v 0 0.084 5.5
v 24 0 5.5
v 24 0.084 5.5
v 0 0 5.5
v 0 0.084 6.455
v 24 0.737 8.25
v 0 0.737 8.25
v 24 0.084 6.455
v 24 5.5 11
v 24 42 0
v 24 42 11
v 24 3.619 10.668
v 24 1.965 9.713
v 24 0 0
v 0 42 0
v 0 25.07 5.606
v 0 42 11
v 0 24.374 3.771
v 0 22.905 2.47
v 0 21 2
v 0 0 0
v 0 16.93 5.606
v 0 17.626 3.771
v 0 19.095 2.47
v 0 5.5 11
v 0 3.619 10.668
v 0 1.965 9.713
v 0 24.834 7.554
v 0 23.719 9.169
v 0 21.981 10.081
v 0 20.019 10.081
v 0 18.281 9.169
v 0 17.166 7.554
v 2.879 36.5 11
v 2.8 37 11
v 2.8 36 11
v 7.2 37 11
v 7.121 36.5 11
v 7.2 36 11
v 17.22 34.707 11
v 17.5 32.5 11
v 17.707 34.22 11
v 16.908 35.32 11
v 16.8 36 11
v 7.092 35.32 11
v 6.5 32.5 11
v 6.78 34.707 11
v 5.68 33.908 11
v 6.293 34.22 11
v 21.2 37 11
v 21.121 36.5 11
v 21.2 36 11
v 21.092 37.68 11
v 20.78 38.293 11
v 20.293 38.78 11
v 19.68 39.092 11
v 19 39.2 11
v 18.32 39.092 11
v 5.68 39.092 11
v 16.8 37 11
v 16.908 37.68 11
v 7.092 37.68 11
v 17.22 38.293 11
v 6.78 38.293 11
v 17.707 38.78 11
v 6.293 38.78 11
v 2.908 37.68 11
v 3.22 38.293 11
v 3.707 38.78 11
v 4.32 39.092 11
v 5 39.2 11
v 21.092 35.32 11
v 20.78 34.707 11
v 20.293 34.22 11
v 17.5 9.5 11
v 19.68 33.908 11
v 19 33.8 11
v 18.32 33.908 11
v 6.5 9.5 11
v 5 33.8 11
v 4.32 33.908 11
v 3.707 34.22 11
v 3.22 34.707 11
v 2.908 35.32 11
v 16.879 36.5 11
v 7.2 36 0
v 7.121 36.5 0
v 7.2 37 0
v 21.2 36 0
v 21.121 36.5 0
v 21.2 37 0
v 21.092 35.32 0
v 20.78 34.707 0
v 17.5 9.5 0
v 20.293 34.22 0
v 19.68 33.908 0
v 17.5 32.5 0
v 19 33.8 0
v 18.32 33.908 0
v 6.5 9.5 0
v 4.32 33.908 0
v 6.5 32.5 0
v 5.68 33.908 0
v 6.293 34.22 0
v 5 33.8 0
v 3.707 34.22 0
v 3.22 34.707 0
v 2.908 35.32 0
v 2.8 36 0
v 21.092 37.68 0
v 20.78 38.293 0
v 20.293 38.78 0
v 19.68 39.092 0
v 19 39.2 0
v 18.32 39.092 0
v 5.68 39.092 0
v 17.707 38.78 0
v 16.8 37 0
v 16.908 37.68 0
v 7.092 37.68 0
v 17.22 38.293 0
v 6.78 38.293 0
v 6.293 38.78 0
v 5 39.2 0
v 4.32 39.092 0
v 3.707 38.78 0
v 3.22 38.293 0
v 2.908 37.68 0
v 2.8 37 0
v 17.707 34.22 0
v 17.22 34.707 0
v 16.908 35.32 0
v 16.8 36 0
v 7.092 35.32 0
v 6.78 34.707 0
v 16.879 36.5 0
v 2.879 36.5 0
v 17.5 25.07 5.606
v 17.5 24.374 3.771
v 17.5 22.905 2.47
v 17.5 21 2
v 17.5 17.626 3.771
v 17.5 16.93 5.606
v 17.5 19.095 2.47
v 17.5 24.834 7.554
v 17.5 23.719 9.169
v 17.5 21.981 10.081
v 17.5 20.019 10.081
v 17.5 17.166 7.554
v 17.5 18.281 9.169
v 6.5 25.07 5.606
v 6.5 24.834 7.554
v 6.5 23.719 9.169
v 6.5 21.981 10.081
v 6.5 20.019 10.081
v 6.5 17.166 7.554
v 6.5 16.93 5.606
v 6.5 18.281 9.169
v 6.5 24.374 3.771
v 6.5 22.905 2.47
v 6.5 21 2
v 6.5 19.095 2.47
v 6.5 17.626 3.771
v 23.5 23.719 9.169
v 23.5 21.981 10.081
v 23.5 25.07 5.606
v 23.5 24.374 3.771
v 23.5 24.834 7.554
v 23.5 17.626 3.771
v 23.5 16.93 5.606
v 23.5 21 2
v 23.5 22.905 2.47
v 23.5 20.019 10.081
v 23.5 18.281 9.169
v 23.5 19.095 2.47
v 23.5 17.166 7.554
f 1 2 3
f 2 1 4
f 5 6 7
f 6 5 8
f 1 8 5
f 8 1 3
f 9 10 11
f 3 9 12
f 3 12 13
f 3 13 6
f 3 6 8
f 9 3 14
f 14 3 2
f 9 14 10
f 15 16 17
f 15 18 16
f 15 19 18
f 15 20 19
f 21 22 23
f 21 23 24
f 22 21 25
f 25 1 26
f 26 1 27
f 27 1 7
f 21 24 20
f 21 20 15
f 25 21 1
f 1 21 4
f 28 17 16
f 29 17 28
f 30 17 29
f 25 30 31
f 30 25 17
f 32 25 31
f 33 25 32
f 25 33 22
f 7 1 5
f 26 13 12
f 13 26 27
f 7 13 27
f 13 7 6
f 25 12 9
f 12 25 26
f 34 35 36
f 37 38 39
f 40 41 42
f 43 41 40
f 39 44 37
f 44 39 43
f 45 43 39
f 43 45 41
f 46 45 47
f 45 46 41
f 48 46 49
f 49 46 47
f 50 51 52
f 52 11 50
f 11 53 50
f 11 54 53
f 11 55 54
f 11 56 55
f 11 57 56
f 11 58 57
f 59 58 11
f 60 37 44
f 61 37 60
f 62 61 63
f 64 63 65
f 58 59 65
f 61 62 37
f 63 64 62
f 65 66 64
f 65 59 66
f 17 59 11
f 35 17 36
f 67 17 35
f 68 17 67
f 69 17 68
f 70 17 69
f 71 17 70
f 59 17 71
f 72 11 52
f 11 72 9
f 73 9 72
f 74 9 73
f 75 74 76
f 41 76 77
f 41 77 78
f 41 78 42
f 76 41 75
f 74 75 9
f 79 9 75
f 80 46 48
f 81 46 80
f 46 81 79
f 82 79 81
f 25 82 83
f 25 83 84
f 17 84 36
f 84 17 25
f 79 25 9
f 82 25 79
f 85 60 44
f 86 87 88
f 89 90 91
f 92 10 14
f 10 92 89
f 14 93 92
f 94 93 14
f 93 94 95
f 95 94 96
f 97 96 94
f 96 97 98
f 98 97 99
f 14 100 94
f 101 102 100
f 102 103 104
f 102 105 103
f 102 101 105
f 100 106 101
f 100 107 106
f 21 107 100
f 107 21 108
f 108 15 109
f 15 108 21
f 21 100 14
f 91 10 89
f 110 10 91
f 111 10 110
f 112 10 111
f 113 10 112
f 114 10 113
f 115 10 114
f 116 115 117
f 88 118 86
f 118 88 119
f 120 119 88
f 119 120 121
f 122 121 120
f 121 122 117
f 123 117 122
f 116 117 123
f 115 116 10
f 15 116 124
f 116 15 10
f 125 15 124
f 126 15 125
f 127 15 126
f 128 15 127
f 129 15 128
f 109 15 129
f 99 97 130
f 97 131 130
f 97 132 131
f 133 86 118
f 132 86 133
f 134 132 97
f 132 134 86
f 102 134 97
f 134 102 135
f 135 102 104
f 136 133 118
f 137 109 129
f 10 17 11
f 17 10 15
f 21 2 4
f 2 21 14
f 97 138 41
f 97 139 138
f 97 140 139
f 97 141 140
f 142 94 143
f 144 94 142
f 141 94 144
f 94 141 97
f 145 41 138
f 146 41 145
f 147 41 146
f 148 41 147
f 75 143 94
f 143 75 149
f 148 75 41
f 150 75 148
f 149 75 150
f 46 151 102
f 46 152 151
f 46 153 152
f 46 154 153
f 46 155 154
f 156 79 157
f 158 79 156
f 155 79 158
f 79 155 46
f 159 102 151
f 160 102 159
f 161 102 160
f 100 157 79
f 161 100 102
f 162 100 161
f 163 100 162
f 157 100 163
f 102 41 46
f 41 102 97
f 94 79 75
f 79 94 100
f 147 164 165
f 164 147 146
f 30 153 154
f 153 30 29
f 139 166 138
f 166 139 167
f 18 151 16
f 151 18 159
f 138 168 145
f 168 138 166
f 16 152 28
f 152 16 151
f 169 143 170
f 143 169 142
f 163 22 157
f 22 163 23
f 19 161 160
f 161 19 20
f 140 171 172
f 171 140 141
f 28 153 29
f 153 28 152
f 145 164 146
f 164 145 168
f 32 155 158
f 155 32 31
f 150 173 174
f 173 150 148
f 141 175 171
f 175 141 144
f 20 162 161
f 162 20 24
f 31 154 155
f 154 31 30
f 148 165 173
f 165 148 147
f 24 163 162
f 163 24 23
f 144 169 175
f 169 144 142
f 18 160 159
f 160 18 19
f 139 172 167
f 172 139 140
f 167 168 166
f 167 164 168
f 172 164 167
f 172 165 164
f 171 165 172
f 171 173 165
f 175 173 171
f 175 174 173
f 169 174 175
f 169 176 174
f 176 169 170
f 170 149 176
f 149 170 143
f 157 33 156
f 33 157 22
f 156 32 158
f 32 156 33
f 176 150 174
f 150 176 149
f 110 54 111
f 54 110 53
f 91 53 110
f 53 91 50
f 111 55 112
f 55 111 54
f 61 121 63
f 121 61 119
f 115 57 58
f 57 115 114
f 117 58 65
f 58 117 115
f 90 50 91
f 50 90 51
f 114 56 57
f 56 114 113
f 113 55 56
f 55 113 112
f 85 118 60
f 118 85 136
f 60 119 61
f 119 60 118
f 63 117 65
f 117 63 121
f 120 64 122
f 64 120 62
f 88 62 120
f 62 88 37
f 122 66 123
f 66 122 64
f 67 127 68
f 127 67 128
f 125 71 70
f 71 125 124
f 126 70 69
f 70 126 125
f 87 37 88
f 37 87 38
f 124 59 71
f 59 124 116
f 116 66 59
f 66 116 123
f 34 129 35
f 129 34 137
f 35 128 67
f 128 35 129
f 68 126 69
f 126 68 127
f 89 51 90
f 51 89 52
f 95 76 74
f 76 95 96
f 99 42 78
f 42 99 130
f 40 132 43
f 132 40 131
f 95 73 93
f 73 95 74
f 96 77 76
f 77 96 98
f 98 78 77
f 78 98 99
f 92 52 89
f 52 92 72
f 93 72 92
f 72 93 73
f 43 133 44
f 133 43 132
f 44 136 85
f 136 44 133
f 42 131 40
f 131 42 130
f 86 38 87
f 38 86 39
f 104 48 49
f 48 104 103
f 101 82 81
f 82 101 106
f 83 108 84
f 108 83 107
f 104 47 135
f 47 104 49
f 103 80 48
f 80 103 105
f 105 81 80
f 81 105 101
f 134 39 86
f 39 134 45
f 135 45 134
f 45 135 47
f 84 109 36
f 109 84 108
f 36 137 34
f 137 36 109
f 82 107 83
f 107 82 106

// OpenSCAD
// PRUSA iteration3
// NEMA 17 extruder idler
// GNU GPL v3
// Josef Průša <iam@josefprusa.cz> and contributors
// http://www.reprap.org/wiki/Prusa_Mendel
// http://prusamendel.org


module extruder_idler_base(){
 difference() {translate([0,0,0]) cube([24,42,8+3]);
 difference() {
  translate([-1,-1,(8+3)/2]) cube([26,(8+3)/2+1,8+3]);
  translate([0,(8+3)/2,(8+3)/2])rotate([0,90,0])cylinder(r = (8+3)/2, h =24);
 }	
}}

module extruder_idler_holes(){
 translate([12,21,0]){
  // Main cutout
  cube([11,23,25], center= true);
  // Idler shaft
  translate([-12-0.5,0,4.1+2])rotate([0,90,0])cylinder(r=4.1, h=24);
  // Screw holes
  //translate([7,-16,-1])cylinder(r=2.2, h=24);
  //translate([-7,-16,-1])cylinder(r=2.2, h=24);
  translate([7,16,-1])cylinder(r=2.2, h=24, $fn=20);
  translate([-7,16,-1])cylinder(r=2.2, h=24, $fn=20);

  translate([7,15,-1])cylinder(r=2.2, h=24, $fn=20);
  translate([-7,15,-1])cylinder(r=2.2, h=24, $fn=20);
 }
}


// Idler final part
module idler(){
 difference(){
  extruder_idler_base();
  extruder_idler_holes();
 }
}

idler();
